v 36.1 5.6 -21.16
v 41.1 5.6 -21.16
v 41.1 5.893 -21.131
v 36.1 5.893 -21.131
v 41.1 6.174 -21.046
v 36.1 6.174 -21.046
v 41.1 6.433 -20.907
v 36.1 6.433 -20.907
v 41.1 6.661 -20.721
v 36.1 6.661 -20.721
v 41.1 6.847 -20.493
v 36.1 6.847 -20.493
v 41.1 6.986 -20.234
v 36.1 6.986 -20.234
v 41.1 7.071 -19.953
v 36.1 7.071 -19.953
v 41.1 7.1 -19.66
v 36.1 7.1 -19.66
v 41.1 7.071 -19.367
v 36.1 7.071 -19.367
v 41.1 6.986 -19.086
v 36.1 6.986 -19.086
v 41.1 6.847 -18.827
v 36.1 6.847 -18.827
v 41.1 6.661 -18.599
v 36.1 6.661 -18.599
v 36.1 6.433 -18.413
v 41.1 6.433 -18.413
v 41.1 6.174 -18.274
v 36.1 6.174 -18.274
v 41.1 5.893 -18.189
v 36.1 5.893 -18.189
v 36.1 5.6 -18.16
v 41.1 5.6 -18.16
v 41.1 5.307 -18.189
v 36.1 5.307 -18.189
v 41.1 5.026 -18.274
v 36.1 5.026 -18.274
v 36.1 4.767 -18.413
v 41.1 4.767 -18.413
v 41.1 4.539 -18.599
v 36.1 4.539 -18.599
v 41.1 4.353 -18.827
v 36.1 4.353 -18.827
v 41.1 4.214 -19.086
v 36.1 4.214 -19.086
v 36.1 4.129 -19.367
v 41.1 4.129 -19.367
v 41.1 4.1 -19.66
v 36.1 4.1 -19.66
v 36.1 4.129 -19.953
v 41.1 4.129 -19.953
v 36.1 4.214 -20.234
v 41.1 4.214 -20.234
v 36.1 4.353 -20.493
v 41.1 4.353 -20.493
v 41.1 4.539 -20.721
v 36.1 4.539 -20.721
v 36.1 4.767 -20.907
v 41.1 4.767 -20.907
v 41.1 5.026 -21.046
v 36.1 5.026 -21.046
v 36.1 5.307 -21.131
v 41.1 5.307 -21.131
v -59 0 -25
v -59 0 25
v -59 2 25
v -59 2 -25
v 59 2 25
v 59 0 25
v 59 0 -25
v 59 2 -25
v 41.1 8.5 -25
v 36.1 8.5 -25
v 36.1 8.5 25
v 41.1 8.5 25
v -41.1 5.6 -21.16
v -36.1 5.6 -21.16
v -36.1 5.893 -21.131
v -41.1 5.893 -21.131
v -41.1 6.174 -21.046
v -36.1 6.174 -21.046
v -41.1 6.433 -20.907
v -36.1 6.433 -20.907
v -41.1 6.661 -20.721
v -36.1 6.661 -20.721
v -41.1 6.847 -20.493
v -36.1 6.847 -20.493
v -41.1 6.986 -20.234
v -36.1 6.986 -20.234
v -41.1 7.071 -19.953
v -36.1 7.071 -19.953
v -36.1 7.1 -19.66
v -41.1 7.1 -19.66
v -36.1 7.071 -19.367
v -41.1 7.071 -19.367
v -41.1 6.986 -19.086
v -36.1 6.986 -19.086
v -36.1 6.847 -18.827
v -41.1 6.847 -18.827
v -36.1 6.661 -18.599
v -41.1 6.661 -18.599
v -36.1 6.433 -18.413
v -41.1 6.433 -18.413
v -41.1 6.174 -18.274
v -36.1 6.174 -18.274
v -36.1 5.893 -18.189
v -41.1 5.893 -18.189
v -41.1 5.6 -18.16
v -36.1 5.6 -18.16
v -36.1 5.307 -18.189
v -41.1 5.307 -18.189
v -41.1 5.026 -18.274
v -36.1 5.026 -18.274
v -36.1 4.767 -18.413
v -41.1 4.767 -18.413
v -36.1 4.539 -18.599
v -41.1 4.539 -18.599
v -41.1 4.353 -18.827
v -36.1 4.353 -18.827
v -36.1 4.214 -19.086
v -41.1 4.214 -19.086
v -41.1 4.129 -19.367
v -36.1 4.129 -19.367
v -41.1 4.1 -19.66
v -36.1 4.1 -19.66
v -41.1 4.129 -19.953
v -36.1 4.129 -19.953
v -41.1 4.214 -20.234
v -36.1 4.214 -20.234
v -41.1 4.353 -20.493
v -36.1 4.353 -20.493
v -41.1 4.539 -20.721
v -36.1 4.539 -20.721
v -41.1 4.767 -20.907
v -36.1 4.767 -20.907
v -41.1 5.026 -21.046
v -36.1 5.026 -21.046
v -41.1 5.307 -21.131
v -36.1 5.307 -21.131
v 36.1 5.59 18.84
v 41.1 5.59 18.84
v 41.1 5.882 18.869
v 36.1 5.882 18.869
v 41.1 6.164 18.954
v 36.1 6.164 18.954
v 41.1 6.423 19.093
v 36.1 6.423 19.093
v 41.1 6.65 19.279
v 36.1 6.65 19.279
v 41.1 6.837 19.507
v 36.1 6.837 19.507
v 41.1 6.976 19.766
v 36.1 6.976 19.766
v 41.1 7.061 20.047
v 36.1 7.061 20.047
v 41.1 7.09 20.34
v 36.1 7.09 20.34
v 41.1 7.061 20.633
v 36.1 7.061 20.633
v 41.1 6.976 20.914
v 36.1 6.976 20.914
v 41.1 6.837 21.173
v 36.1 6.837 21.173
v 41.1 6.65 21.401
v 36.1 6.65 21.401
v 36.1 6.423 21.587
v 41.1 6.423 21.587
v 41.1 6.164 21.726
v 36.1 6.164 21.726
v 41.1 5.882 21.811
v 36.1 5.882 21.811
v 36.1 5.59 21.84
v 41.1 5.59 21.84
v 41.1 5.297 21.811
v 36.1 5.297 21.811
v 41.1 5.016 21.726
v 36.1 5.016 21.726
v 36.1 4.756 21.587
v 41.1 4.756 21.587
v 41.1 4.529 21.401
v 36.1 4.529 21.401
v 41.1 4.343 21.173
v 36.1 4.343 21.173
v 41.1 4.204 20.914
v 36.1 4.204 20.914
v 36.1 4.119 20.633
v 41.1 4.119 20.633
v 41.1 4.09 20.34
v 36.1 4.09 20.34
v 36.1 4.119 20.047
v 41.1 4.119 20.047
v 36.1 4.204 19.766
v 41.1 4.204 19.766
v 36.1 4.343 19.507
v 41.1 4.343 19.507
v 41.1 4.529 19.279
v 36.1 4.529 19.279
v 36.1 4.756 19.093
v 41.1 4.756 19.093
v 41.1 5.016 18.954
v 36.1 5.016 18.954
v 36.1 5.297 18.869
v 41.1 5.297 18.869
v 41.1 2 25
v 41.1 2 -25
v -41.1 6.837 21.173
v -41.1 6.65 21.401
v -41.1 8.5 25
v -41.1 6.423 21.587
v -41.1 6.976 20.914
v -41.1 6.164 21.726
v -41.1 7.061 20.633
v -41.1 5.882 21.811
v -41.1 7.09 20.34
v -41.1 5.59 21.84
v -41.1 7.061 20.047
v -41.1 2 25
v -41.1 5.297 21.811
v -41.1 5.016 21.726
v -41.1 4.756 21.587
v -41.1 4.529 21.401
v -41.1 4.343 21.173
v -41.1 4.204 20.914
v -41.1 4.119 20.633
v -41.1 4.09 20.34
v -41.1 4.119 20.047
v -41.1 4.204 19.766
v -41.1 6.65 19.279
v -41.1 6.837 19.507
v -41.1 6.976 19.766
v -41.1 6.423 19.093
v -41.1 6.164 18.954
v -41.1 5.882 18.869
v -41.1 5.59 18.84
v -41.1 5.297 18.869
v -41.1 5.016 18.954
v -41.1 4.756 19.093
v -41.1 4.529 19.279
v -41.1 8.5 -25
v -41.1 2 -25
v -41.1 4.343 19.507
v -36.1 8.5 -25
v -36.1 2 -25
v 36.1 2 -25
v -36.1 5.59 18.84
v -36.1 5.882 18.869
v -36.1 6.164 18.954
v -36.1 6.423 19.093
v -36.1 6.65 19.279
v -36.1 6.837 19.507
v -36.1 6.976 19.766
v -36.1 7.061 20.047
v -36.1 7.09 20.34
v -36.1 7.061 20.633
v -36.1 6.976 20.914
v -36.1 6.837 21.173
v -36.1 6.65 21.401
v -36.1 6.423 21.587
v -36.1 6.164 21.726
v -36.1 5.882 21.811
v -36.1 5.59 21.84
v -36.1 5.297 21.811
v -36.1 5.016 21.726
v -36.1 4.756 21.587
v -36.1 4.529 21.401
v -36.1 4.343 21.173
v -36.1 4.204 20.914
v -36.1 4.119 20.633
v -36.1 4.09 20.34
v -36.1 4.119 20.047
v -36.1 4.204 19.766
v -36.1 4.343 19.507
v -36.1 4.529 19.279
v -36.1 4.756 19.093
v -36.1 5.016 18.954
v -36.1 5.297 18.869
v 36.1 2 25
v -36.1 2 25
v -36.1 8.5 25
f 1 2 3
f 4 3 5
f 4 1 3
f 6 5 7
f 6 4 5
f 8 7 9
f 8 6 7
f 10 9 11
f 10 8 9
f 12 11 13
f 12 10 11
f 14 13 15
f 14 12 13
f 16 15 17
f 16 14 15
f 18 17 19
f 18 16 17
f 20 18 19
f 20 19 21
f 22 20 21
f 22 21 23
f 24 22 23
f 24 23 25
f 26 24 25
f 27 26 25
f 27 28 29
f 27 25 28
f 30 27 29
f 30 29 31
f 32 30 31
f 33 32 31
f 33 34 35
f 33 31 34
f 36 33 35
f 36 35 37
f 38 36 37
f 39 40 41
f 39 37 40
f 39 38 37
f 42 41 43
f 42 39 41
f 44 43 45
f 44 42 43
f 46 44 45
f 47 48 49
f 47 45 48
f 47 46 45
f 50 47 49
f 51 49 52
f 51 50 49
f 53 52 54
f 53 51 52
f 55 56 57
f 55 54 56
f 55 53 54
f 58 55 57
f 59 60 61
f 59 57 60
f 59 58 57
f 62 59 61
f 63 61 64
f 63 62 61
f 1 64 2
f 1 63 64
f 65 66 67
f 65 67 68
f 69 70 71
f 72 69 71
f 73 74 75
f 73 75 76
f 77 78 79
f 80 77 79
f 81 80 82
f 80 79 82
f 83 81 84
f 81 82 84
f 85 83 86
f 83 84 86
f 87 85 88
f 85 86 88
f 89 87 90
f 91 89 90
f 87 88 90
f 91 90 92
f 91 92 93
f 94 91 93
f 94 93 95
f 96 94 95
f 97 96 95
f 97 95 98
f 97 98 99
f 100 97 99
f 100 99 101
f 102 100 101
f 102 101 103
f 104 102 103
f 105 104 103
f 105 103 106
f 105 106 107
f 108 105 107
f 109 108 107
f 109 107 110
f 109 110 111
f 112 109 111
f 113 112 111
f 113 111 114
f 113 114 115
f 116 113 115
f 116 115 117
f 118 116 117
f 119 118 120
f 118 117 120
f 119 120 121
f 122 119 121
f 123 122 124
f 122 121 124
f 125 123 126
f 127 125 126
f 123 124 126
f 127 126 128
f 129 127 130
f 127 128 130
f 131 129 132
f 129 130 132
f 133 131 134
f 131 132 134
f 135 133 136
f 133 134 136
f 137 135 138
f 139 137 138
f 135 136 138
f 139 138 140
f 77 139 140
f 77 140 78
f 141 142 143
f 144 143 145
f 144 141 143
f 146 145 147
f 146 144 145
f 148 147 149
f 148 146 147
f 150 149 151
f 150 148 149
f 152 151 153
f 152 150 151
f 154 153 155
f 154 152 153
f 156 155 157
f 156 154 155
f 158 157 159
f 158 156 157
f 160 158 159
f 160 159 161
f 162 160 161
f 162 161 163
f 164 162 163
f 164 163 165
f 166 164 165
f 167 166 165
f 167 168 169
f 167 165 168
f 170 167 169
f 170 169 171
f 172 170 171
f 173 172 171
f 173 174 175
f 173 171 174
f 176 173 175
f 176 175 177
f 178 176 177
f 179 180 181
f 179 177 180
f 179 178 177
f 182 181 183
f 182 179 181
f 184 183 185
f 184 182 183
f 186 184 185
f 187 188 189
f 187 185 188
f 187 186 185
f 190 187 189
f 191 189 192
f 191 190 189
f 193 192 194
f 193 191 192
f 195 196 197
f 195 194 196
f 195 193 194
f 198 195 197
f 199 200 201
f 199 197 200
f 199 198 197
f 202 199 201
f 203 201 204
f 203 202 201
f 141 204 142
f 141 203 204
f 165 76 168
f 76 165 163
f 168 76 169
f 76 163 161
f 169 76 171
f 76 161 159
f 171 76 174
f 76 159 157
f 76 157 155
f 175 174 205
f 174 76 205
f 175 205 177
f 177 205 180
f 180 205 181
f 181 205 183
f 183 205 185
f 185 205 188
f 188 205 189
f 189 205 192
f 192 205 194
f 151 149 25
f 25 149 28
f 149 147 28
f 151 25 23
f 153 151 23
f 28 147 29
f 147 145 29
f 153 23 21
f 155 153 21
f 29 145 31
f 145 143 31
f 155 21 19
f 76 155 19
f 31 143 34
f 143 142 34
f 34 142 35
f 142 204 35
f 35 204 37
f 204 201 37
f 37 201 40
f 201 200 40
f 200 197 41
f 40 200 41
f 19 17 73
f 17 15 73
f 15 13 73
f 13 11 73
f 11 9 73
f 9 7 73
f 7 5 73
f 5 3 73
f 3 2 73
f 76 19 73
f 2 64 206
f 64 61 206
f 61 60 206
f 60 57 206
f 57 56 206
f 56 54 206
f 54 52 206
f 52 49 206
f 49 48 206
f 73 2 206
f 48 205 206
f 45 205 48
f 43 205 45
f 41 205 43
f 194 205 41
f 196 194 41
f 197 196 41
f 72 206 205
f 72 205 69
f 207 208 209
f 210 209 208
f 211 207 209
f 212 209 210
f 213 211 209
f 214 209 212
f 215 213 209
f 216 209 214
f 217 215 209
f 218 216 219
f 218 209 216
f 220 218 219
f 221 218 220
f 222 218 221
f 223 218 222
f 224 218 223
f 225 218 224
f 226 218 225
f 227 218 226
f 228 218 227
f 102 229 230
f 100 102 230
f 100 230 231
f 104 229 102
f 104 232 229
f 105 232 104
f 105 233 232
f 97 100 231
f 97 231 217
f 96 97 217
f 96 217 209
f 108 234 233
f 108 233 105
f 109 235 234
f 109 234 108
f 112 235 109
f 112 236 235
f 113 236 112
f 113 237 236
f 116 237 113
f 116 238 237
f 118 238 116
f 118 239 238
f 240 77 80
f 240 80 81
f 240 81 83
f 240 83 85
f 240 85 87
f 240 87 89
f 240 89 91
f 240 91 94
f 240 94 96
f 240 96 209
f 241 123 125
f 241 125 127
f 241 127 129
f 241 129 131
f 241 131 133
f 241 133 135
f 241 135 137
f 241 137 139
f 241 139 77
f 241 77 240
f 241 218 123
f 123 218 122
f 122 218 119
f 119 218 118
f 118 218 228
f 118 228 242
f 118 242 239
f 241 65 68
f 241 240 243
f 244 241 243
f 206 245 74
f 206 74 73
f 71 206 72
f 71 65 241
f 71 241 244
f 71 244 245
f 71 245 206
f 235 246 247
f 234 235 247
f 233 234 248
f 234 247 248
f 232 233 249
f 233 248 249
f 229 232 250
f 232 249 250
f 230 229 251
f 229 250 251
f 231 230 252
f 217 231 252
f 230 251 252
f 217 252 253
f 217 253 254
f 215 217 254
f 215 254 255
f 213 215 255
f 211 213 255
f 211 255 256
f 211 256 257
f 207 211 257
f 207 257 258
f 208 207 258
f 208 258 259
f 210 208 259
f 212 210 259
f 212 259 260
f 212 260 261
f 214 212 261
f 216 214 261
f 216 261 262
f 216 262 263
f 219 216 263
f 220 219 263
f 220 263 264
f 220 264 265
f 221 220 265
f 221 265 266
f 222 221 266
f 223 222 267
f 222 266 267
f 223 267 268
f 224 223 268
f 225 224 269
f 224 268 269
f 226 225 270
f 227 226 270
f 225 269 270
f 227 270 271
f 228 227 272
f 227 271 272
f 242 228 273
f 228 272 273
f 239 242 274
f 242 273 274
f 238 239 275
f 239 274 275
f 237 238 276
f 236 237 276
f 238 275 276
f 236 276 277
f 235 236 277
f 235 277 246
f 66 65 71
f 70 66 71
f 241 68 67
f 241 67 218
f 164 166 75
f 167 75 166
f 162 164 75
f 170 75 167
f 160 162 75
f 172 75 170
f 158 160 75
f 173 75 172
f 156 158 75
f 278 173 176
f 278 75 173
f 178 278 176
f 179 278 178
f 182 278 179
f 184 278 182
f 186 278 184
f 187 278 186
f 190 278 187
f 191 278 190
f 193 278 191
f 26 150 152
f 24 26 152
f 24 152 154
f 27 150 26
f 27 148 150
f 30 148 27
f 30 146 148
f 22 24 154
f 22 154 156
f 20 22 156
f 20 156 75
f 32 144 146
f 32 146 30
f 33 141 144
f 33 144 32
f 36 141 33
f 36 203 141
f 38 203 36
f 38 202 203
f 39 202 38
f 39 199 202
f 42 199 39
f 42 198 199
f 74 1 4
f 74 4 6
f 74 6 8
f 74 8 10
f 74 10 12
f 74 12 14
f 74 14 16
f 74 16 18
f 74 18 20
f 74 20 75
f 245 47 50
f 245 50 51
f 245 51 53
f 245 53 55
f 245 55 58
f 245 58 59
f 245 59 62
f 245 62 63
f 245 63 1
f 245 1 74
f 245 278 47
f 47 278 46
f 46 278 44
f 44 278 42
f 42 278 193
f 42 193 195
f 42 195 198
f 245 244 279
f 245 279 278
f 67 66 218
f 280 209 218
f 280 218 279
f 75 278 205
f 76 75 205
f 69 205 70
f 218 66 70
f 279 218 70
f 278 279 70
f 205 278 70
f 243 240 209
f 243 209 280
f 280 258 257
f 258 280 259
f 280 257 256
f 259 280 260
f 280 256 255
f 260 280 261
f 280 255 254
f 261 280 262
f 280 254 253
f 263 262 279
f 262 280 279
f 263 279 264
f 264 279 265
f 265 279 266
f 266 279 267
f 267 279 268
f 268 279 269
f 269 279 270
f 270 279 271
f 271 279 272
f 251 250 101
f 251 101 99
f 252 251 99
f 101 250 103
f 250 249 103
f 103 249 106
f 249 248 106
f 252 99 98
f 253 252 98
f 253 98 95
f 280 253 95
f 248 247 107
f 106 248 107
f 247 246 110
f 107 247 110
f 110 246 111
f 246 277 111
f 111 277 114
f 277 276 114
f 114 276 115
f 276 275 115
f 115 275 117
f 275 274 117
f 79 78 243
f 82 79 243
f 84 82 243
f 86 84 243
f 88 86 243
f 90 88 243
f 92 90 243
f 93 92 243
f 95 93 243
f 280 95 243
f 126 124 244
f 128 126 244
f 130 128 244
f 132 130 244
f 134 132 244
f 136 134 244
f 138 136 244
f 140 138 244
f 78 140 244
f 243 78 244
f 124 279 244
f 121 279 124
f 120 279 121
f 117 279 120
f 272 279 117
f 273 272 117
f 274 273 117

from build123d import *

# Parameters (mm, degrees)
SKETCH1_W           = 118
SKETCH1_H           = 50
BOSS_EXTRUDE1_DEPTH = 2
SKETCH2_W           = 5
SKETCH2_H           = 50
BOSS_EXTRUDE2_DEPTH = 6.5
SKETCH3_R           = 1.5
CUT_EXTRUDE1_DEPTH  = 7


with BuildPart() as part:
    # Sketch1 → Boss-Extrude1 (new body)
    with BuildSketch(Plane(origin=(0, 0, 0), x_dir=(1, 0, 0), z_dir=(0, 1, 0))):
        Rectangle(SKETCH1_W, SKETCH1_H)
    extrude(amount=BOSS_EXTRUDE1_DEPTH)

    # Sketch2 → Boss-Extrude2 (add)
    with BuildSketch(Plane(origin=(0, 2, 0), x_dir=(1, 0, 0), z_dir=(0, 1, 0))):
        with Locations((-38.6, 0)):
            Rectangle(SKETCH2_W, SKETCH2_H)
        with Locations((38.6, 0)):
            Rectangle(SKETCH2_W, SKETCH2_H)
    extrude(amount=BOSS_EXTRUDE2_DEPTH)

    # Sketch3 → Cut-Extrude1 (cut)
    with BuildSketch(Plane(origin=(-36.1, 0, 0), x_dir=(0, 0, -1), z_dir=(1, 0, 0))):
        with Locations((-20.34, 5.589776131)):
            Circle(SKETCH3_R)
        with Locations((19.66, 5.6)):
            Circle(SKETCH3_R)
    cut_extrude1 = extrude(amount=-CUT_EXTRUDE1_DEPTH, mode=Mode.SUBTRACT)

    # Mirror1: Cut-Extrude1 across plane
    add(cut_extrude1.mirror(Plane(origin=(0, 0, 0), x_dir=(0, 0, 1), z_dir=(1, 0, 0))), mode=Mode.SUBTRACT)


solid = part.part
